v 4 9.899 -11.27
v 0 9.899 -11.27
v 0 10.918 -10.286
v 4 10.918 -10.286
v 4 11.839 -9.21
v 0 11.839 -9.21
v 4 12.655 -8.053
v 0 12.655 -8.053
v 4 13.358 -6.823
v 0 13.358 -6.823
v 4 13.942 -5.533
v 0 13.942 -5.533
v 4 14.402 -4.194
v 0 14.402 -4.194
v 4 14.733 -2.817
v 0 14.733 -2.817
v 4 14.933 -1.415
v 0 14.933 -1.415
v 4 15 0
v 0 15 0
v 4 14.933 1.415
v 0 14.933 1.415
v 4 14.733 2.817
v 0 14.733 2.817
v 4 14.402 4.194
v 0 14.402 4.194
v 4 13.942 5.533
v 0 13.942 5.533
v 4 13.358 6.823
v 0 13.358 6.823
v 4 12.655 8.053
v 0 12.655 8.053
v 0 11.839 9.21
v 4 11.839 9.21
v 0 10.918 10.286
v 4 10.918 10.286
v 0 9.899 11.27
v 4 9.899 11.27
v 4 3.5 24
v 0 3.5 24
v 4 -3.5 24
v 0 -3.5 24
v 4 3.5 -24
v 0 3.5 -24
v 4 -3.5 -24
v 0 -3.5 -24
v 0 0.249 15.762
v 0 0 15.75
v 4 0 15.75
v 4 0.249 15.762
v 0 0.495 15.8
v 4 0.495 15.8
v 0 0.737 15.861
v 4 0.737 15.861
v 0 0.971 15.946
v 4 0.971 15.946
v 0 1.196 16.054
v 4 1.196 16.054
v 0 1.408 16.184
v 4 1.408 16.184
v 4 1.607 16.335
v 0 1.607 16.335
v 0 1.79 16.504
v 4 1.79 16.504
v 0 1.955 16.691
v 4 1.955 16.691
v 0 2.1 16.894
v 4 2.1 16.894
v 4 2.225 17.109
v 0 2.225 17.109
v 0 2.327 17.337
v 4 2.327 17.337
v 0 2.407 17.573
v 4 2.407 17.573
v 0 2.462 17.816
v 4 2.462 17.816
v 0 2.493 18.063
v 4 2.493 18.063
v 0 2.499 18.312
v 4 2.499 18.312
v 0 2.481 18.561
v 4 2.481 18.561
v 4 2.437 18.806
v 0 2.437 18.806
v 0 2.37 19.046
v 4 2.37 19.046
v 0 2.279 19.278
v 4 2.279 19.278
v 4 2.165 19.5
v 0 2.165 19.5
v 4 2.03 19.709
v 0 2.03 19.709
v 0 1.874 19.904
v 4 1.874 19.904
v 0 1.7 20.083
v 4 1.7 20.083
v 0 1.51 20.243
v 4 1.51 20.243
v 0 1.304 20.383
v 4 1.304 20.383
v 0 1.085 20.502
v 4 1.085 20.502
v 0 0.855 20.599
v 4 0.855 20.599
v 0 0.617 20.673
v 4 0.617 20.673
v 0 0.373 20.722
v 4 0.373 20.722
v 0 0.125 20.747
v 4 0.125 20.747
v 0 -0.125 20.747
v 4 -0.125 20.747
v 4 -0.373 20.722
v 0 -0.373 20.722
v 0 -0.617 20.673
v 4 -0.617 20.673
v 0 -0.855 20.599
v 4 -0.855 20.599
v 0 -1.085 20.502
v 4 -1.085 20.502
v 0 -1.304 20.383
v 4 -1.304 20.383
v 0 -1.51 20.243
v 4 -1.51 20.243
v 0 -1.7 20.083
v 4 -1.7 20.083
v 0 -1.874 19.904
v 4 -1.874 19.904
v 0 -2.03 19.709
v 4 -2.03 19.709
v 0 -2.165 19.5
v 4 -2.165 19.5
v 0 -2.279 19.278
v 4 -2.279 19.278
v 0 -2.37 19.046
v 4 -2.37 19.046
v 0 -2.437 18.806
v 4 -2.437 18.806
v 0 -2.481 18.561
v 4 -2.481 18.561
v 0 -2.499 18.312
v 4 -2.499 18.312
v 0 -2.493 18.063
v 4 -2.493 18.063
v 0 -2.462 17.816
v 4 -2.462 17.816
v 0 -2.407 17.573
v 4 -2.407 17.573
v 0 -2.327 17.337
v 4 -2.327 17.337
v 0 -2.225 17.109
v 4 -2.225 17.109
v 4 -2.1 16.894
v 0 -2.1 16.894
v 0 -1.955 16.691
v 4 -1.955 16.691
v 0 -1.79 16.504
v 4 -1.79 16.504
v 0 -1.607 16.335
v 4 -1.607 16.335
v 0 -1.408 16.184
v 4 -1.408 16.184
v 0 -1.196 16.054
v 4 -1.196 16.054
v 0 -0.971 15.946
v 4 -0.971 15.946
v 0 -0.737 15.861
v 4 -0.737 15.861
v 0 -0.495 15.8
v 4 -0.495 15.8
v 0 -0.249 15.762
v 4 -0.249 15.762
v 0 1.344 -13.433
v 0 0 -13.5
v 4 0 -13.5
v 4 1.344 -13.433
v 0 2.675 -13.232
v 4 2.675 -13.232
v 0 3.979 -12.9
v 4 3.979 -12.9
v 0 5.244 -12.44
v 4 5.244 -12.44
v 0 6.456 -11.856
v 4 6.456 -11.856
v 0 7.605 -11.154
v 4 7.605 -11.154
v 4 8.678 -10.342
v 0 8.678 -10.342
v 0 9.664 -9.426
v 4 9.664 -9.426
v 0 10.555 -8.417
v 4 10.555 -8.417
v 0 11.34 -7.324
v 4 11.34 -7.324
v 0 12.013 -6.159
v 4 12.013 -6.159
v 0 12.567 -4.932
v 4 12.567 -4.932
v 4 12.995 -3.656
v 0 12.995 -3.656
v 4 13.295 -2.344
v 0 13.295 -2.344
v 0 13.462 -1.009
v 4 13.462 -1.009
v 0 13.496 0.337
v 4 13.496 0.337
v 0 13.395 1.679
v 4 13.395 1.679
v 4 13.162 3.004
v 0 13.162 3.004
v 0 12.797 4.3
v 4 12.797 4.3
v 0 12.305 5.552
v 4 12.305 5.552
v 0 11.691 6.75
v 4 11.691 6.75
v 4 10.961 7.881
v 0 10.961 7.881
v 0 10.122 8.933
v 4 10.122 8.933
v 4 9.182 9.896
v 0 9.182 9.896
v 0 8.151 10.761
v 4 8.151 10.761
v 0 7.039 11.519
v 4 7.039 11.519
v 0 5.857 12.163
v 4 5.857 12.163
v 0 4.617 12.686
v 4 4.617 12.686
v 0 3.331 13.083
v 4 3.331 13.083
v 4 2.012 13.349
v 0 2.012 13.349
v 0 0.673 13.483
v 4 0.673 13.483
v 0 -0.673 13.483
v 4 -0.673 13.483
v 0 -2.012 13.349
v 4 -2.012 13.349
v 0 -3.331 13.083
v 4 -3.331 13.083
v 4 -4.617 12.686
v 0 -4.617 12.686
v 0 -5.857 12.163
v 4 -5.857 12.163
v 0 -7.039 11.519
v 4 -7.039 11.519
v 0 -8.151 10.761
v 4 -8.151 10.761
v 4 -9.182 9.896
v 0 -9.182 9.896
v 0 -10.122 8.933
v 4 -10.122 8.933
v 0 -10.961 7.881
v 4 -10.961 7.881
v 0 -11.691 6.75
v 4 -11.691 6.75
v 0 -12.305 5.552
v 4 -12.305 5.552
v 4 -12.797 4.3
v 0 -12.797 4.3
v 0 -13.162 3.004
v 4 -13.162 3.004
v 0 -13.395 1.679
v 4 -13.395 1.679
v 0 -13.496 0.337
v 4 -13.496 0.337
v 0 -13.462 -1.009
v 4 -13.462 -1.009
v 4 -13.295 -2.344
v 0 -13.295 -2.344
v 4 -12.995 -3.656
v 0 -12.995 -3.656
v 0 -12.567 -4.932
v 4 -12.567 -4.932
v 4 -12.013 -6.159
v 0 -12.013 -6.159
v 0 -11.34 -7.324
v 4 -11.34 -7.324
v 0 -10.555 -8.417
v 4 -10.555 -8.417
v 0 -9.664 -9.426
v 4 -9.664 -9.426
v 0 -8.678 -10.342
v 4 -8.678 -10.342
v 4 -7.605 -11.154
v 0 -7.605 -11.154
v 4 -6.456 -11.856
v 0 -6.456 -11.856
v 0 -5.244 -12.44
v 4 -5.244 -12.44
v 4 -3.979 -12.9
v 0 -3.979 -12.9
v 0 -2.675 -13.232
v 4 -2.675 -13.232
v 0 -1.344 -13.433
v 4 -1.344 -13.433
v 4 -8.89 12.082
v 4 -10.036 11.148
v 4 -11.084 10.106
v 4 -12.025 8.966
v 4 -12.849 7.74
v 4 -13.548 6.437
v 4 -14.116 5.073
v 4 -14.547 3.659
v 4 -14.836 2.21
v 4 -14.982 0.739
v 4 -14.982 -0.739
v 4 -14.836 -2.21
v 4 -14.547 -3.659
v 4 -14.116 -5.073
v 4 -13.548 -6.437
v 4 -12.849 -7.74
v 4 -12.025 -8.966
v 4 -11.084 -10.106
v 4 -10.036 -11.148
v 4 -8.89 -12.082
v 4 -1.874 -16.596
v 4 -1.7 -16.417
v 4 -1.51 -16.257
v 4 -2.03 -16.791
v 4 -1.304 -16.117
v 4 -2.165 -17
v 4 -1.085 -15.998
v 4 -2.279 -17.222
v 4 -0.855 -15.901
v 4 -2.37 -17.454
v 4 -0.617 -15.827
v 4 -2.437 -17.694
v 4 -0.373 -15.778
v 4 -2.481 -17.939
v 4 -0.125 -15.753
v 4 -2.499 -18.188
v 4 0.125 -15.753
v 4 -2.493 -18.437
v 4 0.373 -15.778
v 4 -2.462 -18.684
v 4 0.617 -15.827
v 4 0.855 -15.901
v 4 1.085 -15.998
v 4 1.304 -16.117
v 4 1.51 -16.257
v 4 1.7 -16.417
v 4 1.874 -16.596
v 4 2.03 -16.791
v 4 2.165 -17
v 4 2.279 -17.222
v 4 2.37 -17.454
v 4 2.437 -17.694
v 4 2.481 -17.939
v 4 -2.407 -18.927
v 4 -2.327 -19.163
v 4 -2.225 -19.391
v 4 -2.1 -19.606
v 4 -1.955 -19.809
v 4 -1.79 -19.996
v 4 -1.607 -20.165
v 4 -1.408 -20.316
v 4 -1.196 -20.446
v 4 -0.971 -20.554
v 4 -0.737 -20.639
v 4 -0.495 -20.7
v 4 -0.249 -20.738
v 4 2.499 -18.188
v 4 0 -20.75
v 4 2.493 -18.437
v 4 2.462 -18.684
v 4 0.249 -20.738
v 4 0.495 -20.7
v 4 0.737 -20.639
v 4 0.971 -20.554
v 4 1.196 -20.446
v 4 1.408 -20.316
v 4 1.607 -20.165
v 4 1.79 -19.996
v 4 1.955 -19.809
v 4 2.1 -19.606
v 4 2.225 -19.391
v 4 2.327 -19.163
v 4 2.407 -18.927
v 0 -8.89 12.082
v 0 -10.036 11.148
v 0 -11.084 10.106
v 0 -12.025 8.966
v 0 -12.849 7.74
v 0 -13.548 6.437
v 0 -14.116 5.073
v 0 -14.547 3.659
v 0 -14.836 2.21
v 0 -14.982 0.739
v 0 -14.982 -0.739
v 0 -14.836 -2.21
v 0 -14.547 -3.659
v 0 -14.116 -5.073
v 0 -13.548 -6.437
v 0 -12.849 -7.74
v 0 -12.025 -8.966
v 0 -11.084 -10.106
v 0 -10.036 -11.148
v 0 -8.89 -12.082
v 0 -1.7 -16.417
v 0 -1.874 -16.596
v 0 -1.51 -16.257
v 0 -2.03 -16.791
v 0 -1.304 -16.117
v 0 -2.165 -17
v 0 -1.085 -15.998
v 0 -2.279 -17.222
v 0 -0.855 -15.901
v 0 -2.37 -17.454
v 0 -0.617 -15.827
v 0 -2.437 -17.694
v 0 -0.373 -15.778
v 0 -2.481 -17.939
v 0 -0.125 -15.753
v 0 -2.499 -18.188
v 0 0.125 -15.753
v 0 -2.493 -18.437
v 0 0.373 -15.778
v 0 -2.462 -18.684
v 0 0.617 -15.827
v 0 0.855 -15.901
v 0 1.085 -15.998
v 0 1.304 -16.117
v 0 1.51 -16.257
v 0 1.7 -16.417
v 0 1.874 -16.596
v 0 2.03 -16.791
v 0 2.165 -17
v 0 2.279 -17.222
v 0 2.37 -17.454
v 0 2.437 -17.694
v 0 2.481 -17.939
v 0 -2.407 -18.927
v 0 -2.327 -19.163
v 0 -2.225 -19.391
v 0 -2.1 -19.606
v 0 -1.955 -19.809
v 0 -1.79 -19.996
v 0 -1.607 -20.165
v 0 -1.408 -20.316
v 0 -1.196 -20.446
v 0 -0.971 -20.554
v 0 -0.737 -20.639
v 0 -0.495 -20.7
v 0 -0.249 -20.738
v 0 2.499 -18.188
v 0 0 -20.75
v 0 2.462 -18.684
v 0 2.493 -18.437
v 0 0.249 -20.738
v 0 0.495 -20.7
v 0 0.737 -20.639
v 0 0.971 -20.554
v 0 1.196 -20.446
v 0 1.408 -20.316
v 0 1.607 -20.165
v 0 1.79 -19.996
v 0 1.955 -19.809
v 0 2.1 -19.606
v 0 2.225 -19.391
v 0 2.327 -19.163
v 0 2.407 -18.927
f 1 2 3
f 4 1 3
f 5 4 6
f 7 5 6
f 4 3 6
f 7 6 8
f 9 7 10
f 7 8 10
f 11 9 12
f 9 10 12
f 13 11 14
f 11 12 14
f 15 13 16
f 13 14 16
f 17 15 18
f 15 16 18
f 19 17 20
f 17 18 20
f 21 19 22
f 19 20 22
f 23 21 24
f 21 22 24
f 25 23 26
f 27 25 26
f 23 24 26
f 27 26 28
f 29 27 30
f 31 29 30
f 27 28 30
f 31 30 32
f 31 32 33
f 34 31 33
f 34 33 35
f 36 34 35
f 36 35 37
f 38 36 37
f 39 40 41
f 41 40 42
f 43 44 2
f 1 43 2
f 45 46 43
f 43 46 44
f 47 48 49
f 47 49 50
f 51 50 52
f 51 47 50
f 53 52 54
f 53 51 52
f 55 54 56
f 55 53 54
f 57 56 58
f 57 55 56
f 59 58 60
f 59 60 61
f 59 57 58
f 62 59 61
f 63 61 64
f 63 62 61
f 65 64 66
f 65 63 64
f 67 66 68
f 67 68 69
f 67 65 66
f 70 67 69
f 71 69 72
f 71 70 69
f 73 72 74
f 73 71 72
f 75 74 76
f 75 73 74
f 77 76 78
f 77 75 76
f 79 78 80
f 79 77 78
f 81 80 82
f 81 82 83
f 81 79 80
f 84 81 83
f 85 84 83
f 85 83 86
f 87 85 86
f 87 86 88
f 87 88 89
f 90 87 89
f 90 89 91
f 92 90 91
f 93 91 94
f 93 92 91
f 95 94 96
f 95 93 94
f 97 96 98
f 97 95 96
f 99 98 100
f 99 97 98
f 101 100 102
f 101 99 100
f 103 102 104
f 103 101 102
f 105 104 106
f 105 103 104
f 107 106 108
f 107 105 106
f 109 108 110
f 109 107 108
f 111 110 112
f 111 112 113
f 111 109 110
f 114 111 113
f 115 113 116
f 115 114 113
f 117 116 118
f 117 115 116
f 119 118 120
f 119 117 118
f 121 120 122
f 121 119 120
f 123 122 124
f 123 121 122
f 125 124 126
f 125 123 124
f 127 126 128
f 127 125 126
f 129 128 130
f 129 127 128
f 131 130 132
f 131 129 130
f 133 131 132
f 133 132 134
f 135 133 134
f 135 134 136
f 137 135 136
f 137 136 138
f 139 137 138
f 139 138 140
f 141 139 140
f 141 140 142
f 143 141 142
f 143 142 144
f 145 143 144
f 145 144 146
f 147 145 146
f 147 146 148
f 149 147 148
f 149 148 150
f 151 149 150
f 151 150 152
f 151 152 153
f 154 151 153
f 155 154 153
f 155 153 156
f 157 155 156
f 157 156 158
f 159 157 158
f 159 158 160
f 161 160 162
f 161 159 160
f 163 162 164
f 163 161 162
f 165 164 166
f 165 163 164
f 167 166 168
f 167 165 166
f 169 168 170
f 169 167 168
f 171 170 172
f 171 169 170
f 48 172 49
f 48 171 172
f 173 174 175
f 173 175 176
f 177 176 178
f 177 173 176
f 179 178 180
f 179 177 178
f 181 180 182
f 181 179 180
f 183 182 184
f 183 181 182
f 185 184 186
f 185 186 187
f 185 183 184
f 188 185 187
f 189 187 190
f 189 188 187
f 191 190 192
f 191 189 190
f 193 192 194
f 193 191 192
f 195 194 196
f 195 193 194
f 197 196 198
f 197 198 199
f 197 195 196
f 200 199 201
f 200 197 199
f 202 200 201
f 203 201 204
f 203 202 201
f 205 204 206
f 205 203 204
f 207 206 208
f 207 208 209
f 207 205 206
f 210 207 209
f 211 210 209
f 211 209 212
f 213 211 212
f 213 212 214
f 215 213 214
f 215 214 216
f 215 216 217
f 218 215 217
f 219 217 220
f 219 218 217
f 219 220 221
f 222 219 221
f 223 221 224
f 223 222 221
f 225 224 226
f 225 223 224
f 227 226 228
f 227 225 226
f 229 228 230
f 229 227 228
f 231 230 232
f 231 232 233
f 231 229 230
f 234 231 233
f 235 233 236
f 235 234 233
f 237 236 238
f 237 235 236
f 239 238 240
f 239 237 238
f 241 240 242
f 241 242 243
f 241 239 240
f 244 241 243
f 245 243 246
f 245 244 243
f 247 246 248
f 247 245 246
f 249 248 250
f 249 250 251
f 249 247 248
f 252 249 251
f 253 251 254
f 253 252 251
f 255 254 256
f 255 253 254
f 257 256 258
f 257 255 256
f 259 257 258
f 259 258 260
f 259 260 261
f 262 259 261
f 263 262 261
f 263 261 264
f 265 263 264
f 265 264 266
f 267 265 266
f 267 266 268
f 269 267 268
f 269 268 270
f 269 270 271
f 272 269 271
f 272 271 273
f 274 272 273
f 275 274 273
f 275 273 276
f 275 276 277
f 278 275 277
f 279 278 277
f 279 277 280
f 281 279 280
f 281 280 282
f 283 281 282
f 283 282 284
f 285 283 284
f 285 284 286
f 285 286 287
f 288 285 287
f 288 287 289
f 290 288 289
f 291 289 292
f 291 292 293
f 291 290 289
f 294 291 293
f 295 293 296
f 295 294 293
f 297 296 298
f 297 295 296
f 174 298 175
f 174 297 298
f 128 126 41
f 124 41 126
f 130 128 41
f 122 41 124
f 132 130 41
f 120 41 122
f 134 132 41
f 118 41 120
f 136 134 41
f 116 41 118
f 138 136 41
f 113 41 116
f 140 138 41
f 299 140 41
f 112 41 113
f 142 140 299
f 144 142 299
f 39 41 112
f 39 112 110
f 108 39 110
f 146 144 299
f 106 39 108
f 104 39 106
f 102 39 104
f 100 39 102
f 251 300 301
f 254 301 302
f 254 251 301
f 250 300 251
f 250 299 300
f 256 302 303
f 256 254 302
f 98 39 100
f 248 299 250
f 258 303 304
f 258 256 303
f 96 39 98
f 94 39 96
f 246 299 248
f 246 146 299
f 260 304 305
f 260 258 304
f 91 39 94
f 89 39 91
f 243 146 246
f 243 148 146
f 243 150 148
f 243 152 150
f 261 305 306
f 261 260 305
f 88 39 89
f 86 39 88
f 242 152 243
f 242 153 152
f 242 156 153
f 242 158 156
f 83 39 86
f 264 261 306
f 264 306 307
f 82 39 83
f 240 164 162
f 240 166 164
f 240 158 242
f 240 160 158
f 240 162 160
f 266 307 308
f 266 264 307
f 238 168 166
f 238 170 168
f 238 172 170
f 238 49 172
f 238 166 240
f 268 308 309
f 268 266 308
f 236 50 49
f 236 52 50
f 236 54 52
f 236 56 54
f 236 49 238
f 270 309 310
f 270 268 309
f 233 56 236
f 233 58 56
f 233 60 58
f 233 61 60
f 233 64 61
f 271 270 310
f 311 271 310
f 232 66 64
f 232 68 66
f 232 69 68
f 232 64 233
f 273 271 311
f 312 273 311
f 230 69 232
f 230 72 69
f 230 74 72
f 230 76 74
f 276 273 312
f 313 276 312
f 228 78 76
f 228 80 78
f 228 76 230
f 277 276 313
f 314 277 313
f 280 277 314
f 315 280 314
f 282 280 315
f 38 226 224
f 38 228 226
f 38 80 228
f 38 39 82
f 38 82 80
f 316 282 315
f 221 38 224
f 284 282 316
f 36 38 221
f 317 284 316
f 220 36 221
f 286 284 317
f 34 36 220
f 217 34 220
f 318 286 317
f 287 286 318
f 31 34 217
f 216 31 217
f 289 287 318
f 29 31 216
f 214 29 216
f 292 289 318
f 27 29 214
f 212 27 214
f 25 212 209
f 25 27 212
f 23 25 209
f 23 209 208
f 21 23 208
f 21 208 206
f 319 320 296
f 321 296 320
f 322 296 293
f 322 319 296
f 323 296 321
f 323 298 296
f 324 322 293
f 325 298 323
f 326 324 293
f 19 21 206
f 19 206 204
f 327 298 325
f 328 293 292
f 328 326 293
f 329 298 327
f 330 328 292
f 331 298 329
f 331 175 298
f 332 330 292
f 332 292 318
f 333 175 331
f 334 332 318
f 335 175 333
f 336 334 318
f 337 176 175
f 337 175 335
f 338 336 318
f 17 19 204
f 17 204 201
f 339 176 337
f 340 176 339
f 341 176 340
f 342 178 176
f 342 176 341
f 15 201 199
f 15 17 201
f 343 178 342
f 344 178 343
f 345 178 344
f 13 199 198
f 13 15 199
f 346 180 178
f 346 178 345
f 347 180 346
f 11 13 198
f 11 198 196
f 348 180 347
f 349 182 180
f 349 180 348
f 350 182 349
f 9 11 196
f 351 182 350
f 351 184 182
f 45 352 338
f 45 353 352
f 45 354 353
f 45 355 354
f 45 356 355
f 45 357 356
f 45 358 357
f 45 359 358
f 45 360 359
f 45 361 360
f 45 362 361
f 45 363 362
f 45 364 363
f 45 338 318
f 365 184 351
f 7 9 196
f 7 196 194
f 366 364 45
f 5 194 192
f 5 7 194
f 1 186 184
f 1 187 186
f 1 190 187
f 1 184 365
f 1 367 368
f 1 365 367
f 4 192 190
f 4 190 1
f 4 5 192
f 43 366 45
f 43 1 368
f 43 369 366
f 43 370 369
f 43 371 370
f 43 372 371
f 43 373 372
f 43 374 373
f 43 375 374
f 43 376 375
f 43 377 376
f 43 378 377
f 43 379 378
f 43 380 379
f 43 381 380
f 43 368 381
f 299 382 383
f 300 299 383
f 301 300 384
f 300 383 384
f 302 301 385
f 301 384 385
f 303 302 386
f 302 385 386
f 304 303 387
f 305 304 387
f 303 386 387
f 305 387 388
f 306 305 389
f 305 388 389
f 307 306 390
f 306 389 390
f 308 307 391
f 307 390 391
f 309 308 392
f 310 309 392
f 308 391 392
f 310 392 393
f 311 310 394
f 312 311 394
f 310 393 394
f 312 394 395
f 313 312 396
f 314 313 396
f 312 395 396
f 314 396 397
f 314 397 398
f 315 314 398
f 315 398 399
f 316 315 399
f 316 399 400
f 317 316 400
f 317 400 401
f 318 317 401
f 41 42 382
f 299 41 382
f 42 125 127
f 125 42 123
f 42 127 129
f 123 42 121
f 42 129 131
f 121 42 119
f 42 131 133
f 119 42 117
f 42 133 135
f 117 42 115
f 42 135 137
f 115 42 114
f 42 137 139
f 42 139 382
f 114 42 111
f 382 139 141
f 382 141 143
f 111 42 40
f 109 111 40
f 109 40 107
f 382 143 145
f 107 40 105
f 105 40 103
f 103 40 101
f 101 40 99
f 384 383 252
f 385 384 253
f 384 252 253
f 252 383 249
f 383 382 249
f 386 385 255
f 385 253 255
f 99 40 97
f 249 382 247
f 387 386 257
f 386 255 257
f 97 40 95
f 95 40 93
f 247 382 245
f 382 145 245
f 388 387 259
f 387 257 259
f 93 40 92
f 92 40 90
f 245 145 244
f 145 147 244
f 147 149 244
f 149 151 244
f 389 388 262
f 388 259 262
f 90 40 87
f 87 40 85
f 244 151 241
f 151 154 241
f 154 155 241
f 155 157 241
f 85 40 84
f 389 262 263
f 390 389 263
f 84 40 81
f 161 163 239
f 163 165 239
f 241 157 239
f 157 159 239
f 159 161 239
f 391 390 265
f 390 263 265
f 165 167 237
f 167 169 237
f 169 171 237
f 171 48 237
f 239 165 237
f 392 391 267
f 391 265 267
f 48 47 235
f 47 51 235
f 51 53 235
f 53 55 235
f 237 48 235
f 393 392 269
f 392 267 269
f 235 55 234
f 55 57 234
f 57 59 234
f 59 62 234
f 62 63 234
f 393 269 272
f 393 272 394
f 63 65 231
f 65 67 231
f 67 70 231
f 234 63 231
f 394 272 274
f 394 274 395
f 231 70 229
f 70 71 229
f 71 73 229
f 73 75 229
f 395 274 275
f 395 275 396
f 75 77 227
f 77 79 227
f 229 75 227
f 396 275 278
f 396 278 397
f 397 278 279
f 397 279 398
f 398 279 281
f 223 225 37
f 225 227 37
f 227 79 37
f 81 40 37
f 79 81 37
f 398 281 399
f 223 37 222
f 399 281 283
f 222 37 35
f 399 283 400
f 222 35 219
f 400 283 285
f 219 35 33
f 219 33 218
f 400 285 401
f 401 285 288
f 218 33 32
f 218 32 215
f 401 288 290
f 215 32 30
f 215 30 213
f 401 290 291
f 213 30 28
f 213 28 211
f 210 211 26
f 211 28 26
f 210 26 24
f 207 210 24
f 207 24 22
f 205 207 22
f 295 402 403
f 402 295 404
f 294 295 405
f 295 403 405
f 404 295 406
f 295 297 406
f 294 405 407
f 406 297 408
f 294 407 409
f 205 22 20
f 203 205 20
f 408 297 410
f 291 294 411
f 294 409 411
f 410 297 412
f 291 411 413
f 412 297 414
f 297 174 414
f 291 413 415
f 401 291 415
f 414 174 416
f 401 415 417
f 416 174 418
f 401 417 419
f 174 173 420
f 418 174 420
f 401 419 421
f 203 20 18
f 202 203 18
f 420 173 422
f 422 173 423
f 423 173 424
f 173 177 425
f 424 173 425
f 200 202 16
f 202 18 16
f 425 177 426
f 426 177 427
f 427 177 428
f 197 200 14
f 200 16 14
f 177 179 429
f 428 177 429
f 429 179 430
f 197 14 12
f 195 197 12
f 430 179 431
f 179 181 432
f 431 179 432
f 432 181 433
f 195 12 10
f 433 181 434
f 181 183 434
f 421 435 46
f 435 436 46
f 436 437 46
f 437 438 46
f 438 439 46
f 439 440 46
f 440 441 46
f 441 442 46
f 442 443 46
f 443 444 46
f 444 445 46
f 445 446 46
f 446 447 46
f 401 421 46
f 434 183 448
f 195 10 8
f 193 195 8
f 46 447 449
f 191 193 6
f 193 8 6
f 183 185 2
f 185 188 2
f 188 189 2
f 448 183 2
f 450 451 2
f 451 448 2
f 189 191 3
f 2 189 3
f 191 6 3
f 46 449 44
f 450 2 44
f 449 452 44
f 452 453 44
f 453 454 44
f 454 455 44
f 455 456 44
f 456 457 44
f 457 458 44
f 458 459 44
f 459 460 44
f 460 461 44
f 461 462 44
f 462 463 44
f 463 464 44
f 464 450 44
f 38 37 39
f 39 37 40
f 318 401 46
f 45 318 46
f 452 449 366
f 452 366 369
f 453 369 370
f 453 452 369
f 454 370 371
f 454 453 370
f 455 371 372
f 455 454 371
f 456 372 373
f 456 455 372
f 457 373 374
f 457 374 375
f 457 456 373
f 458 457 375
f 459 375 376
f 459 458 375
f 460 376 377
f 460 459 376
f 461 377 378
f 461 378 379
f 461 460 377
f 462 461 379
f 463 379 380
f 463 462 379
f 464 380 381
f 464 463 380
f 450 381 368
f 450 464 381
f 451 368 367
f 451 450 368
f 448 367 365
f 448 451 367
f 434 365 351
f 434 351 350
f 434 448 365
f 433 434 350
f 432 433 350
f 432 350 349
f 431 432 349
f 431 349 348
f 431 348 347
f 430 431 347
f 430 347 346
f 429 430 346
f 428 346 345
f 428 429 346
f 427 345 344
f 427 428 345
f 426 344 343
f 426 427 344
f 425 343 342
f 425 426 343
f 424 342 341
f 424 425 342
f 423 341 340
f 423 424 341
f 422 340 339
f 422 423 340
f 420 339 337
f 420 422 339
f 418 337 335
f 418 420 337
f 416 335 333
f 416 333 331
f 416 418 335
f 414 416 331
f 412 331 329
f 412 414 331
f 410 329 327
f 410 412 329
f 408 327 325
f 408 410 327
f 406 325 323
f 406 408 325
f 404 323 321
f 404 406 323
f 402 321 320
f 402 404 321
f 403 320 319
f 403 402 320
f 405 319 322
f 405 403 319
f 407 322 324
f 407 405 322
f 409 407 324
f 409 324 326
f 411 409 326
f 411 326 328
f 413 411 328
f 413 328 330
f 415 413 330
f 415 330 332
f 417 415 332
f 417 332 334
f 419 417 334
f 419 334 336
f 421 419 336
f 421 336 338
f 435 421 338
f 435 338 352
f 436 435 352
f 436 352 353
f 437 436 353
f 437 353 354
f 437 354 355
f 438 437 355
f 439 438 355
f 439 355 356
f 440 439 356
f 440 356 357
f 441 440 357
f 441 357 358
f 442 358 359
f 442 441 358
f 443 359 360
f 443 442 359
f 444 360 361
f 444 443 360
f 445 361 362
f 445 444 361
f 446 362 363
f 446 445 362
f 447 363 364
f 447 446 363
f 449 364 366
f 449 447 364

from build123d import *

# Parameters (mm, degrees)
CROQUIS1_R              = 2.5
CROQUIS1_R_2            = 13.5
SALIENTE_EXTRUIR1_DEPTH = 4


with BuildPart() as part:
    # Croquis1 → Saliente-Extruir1 (new body)
    with BuildSketch(Plane(origin=(0, 0, 0), x_dir=(0, 0, -1), z_dir=(1, 0, 0))):
        with BuildLine():
            Line((-24, 3.5), (-24, -3.5))
            Line((-24, -3.5), (-12.081640676, -8.890104532))
            ThreePointArc((-12.081640676, -8.890104532), (0, -15), (12.081640676, -8.890104532))
            Line((12.081640676, -8.890104532), (24, -3.5))
            Line((24, -3.5), (24, 3.5))
            Line((24, 3.5), (11.269745357, 9.899133275))
            ThreePointArc((11.269745357, 9.899133275), (0, 15), (-11.269745357, 9.899133275))
            Line((-11.269745357, 9.899133275), (-24, 3.5))
        make_face()
        with Locations((-18.25, 0)):
            Circle(CROQUIS1_R, mode=Mode.SUBTRACT)
        with Locations((18.25, 0)):
            Circle(CROQUIS1_R, mode=Mode.SUBTRACT)
        Circle(CROQUIS1_R_2, mode=Mode.SUBTRACT)
    extrude(amount=SALIENTE_EXTRUIR1_DEPTH)


solid = part.part
